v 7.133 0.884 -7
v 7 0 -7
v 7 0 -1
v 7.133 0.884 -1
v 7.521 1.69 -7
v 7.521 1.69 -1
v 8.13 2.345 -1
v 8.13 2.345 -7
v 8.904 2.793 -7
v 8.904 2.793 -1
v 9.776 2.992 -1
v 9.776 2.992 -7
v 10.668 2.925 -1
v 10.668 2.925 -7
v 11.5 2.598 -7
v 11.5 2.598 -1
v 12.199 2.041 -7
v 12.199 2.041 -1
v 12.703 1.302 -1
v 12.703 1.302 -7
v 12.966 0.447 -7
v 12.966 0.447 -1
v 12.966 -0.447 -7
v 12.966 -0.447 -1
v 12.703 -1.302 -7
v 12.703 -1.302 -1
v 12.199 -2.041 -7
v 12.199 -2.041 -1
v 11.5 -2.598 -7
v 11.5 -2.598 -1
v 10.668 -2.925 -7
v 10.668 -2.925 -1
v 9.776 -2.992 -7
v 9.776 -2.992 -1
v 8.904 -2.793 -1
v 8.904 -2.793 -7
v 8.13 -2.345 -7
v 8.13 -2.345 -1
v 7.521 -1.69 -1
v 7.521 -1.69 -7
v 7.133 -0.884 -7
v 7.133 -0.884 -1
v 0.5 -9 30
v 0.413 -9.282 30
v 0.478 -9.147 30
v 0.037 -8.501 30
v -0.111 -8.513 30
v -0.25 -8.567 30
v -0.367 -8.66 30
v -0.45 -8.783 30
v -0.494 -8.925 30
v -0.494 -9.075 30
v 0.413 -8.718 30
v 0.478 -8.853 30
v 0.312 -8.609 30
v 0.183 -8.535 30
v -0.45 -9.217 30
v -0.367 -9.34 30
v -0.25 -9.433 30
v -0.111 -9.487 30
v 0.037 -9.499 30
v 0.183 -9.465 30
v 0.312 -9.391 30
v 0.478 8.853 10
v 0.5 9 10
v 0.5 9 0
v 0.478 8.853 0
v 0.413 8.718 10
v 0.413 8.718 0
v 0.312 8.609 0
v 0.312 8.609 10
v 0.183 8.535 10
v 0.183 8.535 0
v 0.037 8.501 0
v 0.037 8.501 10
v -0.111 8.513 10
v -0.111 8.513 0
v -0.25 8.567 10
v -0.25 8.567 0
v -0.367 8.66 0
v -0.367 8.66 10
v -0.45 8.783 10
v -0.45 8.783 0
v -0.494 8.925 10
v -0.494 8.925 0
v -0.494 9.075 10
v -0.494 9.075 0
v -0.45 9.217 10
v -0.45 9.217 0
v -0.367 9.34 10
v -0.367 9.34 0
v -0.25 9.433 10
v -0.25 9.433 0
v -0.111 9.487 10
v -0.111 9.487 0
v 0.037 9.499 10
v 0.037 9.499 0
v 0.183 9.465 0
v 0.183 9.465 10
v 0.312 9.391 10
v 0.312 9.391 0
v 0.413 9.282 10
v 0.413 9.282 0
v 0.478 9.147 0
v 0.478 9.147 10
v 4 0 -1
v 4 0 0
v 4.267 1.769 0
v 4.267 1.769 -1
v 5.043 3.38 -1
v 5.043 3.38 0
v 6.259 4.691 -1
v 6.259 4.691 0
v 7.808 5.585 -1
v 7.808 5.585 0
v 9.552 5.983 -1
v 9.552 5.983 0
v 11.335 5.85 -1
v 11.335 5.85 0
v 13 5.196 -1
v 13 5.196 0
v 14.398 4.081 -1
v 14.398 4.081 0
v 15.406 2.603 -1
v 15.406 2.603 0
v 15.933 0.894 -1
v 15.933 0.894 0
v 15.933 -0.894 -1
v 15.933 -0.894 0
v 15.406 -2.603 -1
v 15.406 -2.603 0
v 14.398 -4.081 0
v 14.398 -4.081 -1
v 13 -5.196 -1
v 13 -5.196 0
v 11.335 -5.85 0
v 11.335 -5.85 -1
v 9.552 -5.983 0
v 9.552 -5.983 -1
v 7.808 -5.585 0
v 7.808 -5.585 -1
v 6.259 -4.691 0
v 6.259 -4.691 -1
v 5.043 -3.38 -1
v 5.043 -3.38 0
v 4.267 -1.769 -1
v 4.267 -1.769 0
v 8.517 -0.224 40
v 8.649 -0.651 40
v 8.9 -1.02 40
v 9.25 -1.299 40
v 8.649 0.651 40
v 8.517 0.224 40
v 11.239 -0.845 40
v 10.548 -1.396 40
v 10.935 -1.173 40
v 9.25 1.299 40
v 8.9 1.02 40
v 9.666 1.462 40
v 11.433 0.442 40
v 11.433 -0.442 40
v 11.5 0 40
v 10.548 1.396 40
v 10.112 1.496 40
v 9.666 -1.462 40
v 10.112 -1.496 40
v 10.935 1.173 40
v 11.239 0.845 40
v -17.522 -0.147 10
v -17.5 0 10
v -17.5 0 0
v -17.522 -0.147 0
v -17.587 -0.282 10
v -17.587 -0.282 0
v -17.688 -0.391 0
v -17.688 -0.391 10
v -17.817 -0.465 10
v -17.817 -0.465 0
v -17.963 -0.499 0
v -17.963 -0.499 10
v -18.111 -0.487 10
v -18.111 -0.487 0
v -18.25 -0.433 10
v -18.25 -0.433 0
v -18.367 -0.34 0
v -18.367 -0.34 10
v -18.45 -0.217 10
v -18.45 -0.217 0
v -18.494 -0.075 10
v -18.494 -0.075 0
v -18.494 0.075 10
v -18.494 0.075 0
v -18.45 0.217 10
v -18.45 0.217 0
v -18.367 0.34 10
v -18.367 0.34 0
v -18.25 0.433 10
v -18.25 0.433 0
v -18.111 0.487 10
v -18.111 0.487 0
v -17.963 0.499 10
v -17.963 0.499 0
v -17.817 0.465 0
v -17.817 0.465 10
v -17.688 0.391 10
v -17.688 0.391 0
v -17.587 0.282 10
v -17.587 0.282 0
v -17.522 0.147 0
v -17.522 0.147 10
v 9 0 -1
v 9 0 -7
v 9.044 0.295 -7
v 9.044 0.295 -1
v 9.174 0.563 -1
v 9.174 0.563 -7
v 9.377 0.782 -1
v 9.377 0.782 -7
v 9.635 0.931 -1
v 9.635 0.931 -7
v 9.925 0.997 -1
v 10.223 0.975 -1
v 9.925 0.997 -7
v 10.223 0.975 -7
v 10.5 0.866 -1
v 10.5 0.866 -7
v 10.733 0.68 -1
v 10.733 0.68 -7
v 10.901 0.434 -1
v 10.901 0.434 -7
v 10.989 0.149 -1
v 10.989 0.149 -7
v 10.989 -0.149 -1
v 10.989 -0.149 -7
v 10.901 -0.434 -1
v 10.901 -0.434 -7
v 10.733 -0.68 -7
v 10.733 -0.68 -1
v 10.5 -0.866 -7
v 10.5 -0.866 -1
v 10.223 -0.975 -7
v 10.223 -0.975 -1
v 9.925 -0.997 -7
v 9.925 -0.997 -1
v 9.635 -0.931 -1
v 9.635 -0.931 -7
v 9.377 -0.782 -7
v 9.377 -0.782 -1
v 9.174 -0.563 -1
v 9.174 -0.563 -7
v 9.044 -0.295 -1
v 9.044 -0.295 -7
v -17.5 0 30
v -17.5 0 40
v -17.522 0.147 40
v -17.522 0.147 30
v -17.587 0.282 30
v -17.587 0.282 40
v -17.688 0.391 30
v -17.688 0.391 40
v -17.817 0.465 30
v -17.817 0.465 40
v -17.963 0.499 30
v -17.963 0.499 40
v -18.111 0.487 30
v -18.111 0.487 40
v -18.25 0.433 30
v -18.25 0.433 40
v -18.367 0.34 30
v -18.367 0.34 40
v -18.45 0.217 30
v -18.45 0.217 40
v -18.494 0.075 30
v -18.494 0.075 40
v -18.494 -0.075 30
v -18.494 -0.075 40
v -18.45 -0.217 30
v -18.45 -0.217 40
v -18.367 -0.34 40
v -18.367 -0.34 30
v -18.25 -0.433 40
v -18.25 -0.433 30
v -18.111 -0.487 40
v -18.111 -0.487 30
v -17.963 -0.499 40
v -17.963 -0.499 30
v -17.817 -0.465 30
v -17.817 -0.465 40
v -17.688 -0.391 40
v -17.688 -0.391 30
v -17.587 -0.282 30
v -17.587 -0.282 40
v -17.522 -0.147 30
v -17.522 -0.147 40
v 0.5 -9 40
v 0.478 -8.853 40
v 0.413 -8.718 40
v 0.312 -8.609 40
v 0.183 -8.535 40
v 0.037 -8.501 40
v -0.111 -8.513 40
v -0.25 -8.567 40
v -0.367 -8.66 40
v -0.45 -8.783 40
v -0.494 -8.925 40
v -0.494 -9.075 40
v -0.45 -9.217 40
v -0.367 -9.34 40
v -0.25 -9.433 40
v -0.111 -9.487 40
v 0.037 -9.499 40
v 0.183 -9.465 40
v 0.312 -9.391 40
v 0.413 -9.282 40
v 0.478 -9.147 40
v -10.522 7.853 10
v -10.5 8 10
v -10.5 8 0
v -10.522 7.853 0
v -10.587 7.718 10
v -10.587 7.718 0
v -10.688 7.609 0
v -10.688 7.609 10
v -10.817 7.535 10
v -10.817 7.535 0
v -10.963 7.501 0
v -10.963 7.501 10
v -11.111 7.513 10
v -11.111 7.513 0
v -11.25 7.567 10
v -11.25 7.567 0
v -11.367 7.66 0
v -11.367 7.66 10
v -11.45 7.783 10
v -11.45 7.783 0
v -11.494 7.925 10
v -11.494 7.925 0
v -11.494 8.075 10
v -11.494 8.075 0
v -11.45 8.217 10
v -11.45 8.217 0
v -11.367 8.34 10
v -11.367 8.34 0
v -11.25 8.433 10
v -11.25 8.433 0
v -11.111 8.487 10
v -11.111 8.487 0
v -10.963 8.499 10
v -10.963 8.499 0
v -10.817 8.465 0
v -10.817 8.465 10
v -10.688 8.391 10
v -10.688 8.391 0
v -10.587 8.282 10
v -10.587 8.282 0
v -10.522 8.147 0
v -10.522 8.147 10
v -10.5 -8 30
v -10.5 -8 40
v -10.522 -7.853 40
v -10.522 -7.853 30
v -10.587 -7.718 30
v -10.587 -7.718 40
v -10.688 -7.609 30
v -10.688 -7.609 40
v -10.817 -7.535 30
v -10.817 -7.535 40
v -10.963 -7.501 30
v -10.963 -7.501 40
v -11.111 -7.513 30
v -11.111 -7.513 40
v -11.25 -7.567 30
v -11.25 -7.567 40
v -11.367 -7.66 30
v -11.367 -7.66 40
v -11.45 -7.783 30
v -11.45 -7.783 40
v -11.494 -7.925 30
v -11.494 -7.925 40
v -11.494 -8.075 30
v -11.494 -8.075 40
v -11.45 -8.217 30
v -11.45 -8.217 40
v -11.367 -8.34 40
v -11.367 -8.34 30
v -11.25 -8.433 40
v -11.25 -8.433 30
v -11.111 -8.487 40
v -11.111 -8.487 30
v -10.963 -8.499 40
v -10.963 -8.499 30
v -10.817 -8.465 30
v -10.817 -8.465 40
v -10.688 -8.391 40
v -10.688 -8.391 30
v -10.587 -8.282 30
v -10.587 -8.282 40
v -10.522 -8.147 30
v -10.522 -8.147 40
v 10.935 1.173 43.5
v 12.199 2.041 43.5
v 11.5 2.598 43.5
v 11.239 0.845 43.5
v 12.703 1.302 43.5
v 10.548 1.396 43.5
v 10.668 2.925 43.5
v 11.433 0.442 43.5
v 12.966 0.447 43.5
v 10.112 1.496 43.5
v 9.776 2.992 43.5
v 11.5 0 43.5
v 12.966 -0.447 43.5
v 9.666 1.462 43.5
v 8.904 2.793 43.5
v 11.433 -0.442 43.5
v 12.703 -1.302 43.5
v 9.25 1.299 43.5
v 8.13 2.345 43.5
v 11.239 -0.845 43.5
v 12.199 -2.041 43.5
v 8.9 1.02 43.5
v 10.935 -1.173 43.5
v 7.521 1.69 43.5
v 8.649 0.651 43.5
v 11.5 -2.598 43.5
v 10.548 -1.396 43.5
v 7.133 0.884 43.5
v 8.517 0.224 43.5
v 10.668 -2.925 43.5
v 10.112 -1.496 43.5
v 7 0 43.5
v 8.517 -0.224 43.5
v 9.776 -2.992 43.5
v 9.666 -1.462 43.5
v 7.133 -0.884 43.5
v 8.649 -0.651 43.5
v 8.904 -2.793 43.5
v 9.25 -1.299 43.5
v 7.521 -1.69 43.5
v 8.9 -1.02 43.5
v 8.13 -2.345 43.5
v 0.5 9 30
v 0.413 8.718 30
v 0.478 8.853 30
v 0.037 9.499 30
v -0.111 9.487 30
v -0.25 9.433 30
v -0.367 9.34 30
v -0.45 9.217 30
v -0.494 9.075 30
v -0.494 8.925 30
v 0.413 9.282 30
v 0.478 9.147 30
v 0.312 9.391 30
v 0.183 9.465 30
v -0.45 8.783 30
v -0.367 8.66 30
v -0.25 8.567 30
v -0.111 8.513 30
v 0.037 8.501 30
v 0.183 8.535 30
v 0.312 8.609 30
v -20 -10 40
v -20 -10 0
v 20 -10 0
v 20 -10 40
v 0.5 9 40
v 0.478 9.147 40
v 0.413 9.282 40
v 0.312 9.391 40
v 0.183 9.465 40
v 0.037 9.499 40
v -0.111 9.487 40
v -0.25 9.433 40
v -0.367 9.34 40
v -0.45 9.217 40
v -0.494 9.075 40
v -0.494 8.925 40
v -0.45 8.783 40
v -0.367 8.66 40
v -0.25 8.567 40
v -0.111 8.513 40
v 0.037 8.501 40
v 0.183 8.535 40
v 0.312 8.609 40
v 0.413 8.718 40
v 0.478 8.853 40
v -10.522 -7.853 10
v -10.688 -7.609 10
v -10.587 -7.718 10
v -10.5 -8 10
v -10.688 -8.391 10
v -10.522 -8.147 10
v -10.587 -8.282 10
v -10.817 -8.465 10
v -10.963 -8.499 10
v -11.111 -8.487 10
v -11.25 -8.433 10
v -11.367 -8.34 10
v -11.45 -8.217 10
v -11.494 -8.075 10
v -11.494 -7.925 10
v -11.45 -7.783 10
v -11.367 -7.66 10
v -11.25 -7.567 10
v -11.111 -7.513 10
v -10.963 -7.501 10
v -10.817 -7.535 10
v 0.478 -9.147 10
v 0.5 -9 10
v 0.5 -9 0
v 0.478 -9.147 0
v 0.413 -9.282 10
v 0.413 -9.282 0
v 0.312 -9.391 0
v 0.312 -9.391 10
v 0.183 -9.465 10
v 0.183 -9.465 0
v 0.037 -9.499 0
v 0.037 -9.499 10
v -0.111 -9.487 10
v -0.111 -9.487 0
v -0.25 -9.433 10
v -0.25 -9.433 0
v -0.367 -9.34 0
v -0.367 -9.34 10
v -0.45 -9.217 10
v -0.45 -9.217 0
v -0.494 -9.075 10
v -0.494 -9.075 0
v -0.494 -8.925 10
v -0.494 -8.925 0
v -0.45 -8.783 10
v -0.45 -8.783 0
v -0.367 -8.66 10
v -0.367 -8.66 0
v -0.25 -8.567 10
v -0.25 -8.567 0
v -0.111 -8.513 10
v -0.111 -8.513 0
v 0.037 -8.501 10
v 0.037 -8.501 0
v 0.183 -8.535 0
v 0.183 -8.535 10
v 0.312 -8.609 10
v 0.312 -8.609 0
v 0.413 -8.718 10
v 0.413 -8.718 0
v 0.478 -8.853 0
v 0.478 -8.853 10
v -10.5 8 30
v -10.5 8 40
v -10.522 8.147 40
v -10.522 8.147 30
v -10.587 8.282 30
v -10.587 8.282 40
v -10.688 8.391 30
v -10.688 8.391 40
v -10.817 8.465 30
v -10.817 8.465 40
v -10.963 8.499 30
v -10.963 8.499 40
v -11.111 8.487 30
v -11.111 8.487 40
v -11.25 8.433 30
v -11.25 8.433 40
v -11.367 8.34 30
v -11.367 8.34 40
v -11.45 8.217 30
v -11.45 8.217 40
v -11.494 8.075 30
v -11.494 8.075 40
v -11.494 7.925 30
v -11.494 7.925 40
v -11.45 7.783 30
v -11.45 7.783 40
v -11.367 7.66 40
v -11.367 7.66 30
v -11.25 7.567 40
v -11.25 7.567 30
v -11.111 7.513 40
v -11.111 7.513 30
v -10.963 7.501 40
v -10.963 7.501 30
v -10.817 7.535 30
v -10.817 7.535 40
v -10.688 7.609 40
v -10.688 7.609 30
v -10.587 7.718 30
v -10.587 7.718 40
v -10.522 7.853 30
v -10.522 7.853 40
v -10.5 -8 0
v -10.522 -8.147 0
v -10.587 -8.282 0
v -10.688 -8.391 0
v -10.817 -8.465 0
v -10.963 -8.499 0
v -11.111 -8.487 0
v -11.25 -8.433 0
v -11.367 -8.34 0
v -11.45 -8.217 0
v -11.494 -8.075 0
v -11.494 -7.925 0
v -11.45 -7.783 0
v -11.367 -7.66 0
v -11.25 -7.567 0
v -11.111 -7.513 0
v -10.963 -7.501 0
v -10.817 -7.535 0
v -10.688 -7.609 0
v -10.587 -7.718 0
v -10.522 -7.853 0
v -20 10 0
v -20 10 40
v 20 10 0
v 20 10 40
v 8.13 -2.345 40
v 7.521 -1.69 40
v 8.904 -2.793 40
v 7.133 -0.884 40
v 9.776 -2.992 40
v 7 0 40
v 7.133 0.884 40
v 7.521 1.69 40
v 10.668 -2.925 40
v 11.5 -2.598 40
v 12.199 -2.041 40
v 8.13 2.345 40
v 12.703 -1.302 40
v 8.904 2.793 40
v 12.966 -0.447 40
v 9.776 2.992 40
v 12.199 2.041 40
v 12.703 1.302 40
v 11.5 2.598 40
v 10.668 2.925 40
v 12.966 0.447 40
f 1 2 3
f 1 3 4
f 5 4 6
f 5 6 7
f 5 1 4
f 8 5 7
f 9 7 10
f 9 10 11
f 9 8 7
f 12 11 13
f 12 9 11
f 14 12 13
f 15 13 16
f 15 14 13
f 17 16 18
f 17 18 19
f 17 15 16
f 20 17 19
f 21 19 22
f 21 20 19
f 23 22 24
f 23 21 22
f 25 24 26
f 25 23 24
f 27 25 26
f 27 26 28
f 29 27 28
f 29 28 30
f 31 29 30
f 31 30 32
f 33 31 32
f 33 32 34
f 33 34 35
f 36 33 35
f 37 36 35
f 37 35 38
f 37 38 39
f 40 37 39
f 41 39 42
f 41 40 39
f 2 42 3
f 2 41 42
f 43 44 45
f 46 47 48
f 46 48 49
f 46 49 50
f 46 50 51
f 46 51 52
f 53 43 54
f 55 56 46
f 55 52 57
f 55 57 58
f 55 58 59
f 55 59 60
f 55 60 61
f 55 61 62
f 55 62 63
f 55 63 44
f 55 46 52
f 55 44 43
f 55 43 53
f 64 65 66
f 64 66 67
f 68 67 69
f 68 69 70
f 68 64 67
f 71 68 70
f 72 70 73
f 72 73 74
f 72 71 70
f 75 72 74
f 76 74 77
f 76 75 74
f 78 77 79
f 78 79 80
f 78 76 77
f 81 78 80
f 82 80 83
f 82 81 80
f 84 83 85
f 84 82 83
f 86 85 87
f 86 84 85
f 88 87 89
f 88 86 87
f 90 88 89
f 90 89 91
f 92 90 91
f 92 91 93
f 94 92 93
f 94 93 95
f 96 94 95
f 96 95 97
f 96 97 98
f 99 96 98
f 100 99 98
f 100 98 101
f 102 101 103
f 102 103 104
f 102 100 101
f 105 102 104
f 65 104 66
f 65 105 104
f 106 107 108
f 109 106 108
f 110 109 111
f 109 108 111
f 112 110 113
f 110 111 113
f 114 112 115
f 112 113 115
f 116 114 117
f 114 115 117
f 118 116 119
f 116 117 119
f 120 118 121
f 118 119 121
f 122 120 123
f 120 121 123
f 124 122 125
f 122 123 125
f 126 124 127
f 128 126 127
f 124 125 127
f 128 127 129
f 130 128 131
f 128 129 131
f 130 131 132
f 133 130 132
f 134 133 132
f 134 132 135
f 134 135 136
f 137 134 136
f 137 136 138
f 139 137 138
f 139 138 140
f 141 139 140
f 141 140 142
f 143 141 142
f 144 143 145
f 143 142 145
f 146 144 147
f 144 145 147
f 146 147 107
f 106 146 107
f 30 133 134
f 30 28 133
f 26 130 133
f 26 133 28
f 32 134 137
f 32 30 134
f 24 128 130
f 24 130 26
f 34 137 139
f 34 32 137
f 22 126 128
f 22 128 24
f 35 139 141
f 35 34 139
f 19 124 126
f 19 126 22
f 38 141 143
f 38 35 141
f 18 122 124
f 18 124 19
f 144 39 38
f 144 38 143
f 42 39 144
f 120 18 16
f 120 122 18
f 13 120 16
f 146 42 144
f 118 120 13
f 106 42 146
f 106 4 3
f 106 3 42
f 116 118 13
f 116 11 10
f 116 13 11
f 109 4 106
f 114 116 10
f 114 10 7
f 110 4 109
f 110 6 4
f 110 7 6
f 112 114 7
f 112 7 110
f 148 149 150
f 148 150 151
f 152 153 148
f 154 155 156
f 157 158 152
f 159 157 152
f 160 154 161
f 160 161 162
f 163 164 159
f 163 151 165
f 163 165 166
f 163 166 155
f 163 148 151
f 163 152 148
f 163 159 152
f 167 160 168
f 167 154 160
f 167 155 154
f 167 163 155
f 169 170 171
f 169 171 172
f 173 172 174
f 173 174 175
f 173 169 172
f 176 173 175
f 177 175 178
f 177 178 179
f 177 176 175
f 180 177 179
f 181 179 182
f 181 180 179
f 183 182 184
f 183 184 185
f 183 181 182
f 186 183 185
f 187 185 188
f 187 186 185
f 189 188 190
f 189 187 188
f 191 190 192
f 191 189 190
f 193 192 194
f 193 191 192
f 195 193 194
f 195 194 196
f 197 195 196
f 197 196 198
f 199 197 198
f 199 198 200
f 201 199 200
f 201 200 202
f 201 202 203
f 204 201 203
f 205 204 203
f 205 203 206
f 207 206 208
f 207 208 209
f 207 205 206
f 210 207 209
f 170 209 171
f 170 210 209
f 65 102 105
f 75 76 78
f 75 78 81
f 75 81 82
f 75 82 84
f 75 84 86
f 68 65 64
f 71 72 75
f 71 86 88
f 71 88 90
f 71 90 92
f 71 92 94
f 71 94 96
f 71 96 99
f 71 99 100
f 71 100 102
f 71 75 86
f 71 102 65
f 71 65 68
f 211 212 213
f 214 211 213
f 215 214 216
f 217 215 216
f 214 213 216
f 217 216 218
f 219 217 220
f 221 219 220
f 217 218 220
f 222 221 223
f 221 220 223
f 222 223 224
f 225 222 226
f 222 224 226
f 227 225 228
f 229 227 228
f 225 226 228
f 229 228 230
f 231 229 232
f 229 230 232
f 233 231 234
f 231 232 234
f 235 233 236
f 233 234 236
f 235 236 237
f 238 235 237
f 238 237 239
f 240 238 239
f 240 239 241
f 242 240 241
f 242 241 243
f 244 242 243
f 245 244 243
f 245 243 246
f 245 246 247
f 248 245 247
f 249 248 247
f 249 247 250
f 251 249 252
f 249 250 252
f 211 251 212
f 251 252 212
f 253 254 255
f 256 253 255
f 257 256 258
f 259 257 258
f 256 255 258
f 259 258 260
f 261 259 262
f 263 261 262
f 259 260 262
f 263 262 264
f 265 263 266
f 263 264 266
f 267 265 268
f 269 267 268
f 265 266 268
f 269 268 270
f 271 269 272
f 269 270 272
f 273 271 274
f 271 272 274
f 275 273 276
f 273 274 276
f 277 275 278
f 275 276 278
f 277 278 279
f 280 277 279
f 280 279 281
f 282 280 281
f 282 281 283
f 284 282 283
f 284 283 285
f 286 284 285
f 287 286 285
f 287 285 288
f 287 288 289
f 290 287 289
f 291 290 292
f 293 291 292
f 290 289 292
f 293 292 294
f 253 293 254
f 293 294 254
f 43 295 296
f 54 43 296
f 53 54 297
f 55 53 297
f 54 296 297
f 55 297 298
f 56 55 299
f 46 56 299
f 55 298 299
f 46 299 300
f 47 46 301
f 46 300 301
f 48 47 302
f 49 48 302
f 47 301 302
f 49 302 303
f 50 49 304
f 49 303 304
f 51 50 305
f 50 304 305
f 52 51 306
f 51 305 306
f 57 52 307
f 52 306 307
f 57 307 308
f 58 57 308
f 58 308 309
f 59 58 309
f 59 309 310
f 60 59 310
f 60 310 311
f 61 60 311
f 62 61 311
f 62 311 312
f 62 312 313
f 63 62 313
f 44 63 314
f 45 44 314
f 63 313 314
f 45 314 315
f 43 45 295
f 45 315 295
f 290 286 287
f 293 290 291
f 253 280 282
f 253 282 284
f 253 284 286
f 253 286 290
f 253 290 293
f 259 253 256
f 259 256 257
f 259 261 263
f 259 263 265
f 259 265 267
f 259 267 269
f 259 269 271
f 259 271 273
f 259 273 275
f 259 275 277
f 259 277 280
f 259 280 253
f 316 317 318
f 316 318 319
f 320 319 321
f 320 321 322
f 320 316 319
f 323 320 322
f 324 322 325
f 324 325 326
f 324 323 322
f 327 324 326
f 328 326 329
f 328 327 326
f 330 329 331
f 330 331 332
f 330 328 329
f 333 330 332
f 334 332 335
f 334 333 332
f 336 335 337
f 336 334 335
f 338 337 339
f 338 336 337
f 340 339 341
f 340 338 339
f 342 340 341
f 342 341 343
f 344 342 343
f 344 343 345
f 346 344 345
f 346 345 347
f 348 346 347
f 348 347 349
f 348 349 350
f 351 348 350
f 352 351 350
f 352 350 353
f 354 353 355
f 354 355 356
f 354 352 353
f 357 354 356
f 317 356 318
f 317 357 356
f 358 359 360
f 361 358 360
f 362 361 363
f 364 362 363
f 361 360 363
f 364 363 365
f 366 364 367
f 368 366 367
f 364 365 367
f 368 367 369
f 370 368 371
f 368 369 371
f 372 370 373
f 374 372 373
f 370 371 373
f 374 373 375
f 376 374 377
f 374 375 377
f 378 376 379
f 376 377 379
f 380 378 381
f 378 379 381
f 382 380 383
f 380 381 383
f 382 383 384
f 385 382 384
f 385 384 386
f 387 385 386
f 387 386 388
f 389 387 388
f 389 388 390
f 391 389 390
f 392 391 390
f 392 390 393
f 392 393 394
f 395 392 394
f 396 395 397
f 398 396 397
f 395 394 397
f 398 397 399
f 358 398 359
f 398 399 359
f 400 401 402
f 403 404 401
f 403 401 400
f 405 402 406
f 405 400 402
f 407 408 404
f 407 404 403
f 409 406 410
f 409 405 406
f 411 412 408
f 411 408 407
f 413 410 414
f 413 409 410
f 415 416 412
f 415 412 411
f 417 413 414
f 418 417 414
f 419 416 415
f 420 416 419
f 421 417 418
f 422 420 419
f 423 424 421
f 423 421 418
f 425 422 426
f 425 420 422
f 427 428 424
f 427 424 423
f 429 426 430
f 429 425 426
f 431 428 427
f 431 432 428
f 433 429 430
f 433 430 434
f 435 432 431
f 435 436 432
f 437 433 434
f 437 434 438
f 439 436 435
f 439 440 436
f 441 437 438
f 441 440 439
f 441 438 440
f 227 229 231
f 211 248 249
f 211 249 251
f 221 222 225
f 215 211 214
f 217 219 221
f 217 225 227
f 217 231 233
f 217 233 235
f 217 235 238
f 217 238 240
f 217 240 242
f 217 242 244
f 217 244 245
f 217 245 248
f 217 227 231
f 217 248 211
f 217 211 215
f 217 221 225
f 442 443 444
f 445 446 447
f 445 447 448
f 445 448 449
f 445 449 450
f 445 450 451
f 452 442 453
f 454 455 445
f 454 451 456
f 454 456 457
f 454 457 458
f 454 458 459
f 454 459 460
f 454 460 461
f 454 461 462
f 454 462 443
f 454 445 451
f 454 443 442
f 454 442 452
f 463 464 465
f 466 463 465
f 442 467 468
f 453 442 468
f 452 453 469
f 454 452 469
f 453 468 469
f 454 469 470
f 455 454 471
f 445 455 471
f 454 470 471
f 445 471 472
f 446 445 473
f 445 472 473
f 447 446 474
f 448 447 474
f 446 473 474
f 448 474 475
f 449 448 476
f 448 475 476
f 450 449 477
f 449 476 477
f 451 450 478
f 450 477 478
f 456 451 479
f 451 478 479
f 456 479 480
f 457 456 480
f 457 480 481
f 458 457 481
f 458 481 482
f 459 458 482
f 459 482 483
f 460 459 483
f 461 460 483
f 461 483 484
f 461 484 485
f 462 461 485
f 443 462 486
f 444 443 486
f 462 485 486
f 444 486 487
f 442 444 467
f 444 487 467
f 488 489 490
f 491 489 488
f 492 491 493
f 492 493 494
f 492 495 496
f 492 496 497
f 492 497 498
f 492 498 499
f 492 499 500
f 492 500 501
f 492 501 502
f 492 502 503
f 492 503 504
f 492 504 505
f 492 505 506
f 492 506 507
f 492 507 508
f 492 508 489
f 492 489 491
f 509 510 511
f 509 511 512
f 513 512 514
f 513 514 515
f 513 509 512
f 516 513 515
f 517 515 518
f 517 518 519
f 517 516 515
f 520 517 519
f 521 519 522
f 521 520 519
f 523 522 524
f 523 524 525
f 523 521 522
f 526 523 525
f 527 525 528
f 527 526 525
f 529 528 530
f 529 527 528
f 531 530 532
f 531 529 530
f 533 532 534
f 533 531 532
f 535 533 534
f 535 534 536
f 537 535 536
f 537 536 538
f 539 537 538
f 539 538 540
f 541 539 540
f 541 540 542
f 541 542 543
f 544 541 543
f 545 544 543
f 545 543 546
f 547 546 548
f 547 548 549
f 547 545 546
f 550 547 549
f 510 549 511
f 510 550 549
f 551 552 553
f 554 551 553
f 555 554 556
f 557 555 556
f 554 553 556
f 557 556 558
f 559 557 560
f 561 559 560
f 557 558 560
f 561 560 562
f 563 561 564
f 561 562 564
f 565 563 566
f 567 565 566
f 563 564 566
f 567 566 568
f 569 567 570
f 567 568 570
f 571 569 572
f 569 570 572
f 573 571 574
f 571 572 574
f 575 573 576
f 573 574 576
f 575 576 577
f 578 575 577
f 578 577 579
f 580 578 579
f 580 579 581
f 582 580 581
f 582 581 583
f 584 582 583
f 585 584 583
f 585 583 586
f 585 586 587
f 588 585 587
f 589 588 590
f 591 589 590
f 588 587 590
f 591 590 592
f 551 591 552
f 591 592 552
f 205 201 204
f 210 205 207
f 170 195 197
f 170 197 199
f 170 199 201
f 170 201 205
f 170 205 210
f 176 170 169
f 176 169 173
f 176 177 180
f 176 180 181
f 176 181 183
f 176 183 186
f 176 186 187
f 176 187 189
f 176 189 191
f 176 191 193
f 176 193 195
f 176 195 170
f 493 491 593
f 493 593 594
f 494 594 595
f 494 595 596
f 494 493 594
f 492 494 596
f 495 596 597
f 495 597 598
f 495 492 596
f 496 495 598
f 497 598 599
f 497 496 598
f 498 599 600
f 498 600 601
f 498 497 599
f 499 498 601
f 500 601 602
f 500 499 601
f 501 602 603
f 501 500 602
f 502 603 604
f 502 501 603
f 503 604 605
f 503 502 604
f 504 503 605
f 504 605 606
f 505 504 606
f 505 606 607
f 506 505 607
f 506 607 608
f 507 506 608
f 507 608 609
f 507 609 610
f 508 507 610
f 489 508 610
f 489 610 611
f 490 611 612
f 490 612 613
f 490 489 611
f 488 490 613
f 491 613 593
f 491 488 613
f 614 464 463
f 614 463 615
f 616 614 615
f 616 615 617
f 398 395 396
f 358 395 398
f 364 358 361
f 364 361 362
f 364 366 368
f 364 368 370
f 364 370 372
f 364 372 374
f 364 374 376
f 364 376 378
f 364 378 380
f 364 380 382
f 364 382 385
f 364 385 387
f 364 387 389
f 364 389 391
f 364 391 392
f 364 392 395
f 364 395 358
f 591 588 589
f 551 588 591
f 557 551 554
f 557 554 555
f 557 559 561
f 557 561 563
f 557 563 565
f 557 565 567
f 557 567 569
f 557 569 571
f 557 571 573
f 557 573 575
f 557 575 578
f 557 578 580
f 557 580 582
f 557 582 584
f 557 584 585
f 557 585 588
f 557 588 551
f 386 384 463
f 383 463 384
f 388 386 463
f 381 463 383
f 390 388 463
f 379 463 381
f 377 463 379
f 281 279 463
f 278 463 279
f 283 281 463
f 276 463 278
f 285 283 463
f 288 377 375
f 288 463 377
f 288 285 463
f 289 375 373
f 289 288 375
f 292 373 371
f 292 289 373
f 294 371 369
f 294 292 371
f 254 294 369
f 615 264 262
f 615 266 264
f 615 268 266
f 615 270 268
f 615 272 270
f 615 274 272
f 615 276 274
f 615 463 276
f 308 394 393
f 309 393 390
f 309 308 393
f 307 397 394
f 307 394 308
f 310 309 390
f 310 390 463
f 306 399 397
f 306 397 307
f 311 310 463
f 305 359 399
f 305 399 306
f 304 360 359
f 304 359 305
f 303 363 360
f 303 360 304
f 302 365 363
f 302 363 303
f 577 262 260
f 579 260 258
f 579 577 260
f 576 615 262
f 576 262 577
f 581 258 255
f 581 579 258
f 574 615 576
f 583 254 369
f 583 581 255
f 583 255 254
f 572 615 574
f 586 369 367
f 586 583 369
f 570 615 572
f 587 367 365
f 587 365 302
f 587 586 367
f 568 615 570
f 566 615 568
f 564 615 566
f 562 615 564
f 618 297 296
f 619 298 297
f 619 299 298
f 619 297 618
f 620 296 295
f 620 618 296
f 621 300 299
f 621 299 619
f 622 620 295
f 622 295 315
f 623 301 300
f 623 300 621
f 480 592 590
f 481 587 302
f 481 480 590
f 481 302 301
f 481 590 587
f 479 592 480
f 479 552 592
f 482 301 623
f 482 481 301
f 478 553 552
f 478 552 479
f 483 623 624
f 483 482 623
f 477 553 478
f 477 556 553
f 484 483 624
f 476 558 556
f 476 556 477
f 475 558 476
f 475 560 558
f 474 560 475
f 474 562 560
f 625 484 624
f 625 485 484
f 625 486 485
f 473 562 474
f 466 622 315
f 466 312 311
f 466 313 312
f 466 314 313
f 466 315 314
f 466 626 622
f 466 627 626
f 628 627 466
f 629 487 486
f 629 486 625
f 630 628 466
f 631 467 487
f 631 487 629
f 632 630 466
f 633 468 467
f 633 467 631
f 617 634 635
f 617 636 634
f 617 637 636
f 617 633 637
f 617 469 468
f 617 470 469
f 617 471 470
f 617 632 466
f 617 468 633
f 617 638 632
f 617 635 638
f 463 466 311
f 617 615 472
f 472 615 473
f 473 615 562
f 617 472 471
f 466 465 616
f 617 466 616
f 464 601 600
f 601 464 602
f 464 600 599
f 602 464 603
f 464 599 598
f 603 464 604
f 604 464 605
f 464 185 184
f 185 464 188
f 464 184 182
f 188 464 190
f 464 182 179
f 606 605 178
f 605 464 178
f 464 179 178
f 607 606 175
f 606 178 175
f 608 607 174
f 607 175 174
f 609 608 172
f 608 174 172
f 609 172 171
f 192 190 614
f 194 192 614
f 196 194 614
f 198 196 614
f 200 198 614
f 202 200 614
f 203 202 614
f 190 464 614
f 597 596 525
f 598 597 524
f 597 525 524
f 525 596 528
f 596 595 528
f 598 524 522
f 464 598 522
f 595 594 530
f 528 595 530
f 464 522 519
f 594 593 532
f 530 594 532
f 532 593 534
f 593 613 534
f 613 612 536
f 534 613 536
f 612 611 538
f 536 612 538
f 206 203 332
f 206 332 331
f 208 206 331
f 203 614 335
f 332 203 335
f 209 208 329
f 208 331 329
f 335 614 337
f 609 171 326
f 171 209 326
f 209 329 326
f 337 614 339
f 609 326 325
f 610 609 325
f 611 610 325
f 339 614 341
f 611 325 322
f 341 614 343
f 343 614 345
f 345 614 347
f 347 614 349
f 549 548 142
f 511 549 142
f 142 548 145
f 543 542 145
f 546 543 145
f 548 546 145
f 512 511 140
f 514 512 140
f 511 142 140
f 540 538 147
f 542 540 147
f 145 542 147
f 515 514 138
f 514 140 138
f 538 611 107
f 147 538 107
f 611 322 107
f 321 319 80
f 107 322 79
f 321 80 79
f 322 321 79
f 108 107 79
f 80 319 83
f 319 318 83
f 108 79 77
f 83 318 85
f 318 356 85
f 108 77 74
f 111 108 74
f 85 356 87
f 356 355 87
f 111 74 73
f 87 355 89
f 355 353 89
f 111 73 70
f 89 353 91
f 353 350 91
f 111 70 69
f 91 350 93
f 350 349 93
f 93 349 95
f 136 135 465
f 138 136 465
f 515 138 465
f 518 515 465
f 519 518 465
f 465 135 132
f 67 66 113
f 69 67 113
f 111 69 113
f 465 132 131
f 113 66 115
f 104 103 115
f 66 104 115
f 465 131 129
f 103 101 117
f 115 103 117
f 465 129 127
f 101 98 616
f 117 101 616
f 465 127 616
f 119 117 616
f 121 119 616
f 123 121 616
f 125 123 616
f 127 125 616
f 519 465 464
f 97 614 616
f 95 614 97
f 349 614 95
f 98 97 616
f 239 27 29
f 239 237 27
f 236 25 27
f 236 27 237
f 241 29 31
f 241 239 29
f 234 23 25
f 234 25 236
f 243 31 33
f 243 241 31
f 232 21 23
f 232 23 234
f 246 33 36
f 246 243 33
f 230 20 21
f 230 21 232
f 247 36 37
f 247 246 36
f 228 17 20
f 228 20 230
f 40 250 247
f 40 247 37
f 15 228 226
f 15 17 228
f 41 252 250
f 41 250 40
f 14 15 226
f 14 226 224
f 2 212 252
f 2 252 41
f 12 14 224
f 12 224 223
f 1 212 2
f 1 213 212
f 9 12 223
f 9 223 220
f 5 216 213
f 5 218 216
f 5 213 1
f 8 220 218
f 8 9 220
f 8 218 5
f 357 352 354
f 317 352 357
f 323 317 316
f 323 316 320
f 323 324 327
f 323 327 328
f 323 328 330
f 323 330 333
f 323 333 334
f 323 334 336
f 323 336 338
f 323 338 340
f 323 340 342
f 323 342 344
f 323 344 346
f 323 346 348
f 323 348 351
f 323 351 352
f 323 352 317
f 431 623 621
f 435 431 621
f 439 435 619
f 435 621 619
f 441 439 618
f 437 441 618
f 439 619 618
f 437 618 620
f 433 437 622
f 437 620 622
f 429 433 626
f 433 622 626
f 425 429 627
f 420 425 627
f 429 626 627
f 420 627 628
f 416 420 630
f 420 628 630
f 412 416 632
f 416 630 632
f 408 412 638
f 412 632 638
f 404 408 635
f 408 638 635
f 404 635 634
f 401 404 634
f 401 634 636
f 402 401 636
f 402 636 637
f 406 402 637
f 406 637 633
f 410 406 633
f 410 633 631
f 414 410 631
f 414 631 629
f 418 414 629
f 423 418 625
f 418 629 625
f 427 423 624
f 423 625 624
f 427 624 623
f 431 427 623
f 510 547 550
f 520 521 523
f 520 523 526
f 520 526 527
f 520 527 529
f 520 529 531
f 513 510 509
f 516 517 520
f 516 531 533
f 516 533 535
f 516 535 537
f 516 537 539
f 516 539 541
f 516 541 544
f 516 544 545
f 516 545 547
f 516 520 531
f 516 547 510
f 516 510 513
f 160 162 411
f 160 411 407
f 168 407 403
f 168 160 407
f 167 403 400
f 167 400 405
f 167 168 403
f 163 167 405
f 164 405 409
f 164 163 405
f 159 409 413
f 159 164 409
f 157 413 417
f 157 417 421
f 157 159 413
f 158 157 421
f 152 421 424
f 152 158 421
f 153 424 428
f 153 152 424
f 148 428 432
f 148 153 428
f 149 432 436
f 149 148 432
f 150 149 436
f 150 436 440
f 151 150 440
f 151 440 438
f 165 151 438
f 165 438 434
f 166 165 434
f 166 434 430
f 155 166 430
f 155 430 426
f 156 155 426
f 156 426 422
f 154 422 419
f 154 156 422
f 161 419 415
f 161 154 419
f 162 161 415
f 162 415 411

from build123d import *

# Parameters (mm, degrees)
SKETCH_1_W          = 40
SKETCH_1_H          = 20
EXTRUDE_1_DEPTH     = 40
SKETCH_2_R          = 3
SKETCH_2_R_2        = 1.5
EXTRUDE_2_DEPTH     = 3.5
SKETCH_3_R          = 6
EXTRUDE_3_DEPTH     = 1
EXTRUDE_START       = 6
SKETCH_4_R          = 3
SKETCH_4_R_2        = 1
EXTRUDE_4_DEPTH     = 6
SKETCH_5_R          = 0.5
CUT_EXTRUDE_1_DEPTH = 10
CUT_EXTRUDE_START   = -10
SKETCH_6_R          = 0.5
CUT_EXTRUDE_2_DEPTH = 10


with BuildPart() as part:
    # 草图1 → 凸台-拉伸1 (new body)
    with BuildSketch(Plane.XY):
        Rectangle(SKETCH_1_W, SKETCH_1_H)
    extrude(amount=EXTRUDE_1_DEPTH)

    # 草图2 → 凸台-拉伸2 (add)
    with BuildSketch(Plane.XY.offset(40)):
        with Locations(Location((10, 0, 0), (0, 0, 180))):
            Circle(SKETCH_2_R)
        with Locations((10, 0)):
            Circle(SKETCH_2_R_2, mode=Mode.SUBTRACT)
    extrude(amount=EXTRUDE_2_DEPTH)

    # 草图3 → 凸台-拉伸3 (add)
    with BuildSketch(Plane(origin=(0, 0, 0), x_dir=(-1, 0, 0), z_dir=(0, 0, -1))):
        with Locations((-10, 0)):
            Circle(SKETCH_3_R)
    extrude(amount=EXTRUDE_3_DEPTH)

    # 草图4 → 凸台-拉伸4 (add)
    with BuildSketch(Plane(origin=(0, 0, -1), x_dir=(-1, 0, 0), z_dir=(0, 0, -1)).offset(EXTRUDE_START)):
        with Locations((-10, 0)):
            Circle(SKETCH_4_R)
        with Locations((-10, 0)):
            Circle(SKETCH_4_R_2, mode=Mode.SUBTRACT)
    extrude(amount=-EXTRUDE_4_DEPTH)

    # 草图5 → 切除-拉伸1 (cut)
    with BuildSketch(Plane.XY.offset(40)):
        with Locations((-18, 0)):
            Circle(SKETCH_5_R)
        with Locations((-11, 8)):
            Circle(SKETCH_5_R)
        with Locations((0, 9)):
            Circle(SKETCH_5_R)
        with Locations((-11, -8)):
            Circle(SKETCH_5_R)
        with Locations((0, -9)):
            Circle(SKETCH_5_R)
    extrude(amount=-CUT_EXTRUDE_1_DEPTH, mode=Mode.SUBTRACT)

    # 草图6 → 切除-拉伸2 (cut)
    with BuildSketch(Plane(origin=(0, 0, 0), x_dir=(-1, 0, 0), z_dir=(0, 0, -1)).offset(CUT_EXTRUDE_START)):
        with Locations(Location((18, 0, 0), (0, 0, 180))):
            Circle(SKETCH_6_R)
        with Locations(Location((11, -8, 0), (0, 0, 180))):
            Circle(SKETCH_6_R)
        with Locations(Location((0, -9, 0), (0, 0, 180))):
            Circle(SKETCH_6_R)
        with Locations(Location((11, 8, 0), (0, 0, 180))):
            Circle(SKETCH_6_R)
        with Locations(Location((0, 9, 0), (0, 0, 180))):
            Circle(SKETCH_6_R)
    extrude(amount=CUT_EXTRUDE_2_DEPTH, mode=Mode.SUBTRACT)


solid = part.part
